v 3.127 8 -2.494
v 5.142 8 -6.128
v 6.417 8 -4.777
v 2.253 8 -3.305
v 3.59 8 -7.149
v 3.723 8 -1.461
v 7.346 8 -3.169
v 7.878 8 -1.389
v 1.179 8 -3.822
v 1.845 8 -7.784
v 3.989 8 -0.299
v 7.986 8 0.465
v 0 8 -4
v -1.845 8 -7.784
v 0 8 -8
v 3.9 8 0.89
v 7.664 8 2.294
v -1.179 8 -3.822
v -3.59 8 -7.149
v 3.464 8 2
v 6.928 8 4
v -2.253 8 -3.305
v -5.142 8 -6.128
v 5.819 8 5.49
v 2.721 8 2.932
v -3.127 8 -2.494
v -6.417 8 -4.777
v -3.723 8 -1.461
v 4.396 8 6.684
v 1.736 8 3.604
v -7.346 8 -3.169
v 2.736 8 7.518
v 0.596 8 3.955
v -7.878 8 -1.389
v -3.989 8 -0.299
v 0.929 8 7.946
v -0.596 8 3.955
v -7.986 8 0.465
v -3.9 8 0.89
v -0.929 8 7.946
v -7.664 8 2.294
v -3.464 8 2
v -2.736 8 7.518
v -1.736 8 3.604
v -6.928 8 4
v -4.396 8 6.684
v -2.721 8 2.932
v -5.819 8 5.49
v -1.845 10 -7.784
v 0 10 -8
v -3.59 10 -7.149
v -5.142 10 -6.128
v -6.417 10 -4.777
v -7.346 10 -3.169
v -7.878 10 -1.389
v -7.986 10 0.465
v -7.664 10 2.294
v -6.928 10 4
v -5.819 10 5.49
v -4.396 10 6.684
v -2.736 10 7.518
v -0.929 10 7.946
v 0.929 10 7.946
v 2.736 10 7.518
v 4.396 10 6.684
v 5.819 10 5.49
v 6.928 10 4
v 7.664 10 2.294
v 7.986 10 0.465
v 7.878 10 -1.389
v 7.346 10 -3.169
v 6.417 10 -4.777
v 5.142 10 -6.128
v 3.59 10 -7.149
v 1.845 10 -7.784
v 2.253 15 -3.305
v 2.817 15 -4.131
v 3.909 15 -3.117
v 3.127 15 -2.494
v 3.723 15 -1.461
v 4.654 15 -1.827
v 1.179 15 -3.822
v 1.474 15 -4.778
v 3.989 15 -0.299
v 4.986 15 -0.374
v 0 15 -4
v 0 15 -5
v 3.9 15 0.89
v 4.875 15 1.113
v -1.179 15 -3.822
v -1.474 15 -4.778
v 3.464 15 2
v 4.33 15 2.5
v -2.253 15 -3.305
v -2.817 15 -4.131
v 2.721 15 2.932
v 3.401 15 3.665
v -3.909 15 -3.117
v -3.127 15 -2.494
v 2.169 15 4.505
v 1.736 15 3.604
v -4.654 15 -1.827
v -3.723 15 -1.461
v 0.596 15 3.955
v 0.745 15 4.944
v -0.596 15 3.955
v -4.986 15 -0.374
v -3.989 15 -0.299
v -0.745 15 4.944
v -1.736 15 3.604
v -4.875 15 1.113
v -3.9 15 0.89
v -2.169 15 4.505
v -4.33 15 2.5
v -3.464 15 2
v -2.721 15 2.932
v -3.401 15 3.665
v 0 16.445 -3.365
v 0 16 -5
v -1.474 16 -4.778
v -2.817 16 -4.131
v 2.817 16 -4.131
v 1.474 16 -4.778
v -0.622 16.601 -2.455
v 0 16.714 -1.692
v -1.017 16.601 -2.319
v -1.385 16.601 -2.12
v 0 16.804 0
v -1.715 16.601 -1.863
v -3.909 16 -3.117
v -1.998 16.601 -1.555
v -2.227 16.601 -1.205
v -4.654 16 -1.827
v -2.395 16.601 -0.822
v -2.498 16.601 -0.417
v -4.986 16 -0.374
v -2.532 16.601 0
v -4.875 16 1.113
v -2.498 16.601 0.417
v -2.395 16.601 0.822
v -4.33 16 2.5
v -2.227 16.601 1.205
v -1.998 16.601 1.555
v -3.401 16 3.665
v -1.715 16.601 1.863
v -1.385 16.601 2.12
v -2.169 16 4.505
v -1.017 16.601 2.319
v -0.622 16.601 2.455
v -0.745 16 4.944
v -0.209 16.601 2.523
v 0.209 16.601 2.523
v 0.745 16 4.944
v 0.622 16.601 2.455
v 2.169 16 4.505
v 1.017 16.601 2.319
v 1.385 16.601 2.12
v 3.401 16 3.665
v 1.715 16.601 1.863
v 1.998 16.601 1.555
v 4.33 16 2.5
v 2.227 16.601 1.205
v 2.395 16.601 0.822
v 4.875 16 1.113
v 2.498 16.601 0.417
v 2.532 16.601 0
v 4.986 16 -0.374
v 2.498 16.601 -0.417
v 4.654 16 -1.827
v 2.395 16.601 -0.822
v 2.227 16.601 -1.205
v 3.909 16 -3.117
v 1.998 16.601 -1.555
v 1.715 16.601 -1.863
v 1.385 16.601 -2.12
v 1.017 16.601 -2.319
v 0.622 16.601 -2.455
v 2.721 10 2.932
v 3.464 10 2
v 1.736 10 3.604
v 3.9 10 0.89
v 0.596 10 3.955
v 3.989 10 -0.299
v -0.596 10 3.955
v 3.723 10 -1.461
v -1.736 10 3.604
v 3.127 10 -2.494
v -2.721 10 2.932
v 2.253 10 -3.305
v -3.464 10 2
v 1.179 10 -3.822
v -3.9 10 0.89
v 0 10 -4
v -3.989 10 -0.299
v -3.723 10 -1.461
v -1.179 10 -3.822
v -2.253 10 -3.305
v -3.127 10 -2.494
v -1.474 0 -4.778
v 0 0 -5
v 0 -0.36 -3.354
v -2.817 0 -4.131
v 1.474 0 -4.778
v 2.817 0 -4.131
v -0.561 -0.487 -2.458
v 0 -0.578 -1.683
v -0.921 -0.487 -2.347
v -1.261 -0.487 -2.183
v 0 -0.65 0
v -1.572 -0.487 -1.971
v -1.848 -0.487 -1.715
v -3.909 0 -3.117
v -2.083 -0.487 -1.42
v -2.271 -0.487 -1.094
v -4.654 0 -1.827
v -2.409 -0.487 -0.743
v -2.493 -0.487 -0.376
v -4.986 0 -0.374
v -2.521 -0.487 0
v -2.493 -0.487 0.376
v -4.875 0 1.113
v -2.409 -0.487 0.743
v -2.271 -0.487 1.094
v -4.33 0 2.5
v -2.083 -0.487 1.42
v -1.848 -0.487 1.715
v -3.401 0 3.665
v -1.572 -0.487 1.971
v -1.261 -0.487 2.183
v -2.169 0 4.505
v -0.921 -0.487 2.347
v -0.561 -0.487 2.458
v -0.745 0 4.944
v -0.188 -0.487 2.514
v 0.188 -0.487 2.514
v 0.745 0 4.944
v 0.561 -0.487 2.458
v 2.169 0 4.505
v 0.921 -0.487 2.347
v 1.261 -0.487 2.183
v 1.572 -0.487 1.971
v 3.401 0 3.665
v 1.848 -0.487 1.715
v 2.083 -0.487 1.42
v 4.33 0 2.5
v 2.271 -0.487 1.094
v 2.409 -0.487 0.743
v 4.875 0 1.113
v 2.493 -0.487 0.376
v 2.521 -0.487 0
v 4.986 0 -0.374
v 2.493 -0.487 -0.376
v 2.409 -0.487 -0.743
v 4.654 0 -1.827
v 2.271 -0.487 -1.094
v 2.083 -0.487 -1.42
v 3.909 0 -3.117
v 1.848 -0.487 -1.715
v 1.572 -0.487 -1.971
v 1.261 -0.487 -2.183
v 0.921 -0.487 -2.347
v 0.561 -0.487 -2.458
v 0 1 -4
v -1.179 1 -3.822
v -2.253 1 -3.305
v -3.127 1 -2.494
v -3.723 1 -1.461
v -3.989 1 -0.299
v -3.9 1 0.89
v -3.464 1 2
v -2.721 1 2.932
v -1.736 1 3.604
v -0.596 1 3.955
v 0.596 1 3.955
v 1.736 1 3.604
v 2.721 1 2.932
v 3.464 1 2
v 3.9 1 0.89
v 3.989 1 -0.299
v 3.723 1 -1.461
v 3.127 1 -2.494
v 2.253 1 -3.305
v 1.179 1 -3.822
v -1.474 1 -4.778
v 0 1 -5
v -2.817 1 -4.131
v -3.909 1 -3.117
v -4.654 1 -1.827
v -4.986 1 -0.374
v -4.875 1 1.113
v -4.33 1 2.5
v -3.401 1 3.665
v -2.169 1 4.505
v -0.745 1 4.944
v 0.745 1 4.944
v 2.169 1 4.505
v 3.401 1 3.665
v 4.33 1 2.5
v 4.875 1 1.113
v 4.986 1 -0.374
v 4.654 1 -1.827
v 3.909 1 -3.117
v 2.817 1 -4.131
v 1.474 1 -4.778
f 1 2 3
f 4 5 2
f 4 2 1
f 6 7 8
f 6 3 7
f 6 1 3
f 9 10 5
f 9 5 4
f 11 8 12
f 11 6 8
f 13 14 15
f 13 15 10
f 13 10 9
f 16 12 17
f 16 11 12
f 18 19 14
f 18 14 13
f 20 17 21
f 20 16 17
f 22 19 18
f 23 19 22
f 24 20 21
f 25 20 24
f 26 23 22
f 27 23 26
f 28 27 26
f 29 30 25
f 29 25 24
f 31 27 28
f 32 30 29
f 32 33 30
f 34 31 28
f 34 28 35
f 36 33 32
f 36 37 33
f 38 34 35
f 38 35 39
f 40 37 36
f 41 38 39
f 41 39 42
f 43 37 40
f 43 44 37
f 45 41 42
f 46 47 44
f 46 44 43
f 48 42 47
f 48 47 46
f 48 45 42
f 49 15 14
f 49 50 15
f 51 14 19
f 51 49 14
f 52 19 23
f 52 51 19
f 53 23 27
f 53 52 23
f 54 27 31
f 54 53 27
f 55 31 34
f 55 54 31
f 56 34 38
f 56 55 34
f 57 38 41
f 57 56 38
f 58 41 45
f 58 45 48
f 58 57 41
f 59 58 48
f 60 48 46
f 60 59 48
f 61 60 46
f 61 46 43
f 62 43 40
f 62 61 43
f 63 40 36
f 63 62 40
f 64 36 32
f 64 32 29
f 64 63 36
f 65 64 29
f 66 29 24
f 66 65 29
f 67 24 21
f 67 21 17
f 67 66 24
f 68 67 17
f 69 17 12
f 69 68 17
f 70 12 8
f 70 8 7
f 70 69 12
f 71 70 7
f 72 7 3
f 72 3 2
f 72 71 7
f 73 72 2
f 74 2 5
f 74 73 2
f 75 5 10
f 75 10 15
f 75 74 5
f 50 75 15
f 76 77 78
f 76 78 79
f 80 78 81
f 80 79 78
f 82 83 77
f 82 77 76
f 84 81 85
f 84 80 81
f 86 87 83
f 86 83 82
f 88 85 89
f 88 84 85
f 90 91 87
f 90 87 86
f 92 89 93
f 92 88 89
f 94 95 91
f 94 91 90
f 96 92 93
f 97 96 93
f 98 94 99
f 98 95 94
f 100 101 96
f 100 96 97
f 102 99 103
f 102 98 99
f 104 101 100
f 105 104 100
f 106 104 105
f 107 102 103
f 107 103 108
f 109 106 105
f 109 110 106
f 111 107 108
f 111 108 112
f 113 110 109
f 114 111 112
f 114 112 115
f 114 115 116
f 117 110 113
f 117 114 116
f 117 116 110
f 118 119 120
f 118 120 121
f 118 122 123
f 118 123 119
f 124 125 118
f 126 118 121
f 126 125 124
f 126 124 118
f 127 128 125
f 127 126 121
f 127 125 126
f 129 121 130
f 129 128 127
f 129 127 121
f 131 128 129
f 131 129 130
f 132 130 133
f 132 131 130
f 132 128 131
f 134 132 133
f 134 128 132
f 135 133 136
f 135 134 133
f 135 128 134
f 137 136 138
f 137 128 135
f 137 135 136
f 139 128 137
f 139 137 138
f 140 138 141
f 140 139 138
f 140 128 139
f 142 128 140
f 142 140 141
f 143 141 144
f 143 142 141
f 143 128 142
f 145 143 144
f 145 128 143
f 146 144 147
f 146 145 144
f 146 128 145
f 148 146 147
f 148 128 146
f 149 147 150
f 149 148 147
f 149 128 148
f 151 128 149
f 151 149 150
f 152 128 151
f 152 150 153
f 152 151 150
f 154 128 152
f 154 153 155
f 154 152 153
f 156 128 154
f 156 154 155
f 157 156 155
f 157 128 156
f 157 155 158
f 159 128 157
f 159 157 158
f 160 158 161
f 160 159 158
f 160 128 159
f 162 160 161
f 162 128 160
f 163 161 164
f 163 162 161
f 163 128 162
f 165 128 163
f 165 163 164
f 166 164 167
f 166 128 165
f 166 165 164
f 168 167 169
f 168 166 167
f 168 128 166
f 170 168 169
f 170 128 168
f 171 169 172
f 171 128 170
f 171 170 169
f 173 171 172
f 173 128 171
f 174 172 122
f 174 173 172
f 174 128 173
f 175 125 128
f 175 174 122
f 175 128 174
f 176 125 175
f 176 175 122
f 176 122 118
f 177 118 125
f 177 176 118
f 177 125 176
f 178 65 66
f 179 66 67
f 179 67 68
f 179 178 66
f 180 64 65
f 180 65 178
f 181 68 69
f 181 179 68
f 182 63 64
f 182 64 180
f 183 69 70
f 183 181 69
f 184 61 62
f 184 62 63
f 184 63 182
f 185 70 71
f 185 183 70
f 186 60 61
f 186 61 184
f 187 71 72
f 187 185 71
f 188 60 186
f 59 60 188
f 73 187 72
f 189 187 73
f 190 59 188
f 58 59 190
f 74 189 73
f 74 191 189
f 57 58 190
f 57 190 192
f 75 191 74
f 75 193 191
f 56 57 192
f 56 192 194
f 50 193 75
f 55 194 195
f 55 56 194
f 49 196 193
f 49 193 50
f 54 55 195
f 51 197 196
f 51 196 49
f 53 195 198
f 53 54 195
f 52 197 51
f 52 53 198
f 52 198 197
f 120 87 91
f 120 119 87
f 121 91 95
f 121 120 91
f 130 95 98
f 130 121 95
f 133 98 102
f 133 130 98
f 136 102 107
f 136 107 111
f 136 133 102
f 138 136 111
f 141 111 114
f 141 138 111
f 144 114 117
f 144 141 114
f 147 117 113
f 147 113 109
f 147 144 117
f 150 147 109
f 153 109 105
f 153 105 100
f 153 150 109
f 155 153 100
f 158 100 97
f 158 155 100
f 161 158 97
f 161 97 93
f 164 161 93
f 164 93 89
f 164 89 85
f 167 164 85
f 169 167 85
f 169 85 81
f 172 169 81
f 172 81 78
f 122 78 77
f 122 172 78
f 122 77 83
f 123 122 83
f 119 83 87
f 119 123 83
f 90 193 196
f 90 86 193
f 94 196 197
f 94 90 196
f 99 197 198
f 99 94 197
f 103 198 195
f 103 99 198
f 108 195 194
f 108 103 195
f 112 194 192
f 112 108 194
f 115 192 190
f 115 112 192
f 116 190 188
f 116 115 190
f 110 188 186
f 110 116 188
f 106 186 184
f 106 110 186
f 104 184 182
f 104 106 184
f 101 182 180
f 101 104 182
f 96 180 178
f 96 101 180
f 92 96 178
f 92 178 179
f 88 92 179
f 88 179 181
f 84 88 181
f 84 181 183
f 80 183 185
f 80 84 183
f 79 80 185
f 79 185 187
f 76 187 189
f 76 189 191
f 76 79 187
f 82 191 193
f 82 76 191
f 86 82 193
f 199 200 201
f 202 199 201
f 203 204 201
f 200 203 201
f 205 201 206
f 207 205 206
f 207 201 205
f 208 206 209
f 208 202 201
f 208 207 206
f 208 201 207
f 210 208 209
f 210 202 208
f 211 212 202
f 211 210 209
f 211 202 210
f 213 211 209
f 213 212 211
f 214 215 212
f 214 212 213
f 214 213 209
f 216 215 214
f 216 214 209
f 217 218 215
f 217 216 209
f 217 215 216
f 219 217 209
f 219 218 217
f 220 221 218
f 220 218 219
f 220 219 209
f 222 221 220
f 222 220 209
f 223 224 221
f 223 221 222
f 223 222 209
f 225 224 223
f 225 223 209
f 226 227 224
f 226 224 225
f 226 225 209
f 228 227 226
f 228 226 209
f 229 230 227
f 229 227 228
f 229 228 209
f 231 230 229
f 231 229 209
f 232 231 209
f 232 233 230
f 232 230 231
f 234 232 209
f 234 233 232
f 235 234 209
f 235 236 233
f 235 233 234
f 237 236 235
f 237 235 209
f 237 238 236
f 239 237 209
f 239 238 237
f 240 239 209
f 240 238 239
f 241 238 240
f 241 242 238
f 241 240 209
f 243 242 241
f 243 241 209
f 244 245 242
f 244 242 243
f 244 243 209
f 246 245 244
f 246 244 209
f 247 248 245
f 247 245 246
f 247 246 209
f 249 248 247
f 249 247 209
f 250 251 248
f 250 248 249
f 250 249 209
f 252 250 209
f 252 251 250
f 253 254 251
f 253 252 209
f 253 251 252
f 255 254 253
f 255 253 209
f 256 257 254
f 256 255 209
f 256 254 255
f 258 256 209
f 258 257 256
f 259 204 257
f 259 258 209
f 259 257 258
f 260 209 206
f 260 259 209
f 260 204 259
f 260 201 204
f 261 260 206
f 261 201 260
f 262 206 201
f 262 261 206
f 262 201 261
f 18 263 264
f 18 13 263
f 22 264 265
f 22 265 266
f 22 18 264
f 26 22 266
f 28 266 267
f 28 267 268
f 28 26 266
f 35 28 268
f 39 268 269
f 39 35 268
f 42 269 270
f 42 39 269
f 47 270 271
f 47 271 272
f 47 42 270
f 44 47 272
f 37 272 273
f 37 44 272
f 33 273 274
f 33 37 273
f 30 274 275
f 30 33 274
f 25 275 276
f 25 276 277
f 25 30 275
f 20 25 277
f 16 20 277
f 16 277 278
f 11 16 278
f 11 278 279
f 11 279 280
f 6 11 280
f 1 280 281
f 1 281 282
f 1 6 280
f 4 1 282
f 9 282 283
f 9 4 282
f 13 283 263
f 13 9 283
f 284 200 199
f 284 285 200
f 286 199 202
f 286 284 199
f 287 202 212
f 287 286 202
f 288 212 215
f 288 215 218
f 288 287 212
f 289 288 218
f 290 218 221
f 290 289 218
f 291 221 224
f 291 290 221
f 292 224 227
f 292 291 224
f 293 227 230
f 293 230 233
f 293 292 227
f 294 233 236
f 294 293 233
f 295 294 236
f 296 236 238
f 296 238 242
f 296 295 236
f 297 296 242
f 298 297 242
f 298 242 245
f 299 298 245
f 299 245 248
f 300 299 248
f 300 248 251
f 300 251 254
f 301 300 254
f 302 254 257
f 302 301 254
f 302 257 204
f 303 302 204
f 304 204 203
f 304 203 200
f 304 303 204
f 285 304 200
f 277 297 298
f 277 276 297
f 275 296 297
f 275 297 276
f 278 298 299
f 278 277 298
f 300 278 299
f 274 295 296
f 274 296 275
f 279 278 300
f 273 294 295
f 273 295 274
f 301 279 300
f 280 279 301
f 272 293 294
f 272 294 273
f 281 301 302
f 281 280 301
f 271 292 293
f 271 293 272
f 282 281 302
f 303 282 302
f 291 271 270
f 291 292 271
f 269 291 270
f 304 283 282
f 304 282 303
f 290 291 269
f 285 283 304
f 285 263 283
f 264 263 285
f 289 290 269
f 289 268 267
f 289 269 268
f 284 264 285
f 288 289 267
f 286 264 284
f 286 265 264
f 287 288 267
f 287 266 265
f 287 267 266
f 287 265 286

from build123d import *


with BuildPart() as part:
    # Esquisse1 → Base-Révolution (revolve)
    with BuildSketch(Plane.XY, mode=Mode.PRIVATE) as base_r_volution_sk:
        with BuildLine():
            Line((0, 0), (0, -0.650445183))
            ThreePointArc((0, -0.650445183), (-2.521065198, -0.487151674), (-5, 0))
            Line((-5, 0), (-5, 1))
            Line((-5, 1), (-4, 1))
            Line((-4, 1), (-4, 8))
            Line((-4, 8), (-8, 8))
            Line((-8, 8), (-8, 10))
            Line((-8, 10), (-4, 10))
            Line((-4, 10), (-4, 15))
            Line((-4, 15), (-5, 15))
            Line((-5, 15), (-5, 16))
            ThreePointArc((-5, 16), (-2.53207593, 16.601354724), (0, 16.803513576))
            Line((0, 16.803513576), (0, 16))
            Line((0, 16), (0, 0))
        make_face()
    revolve(base_r_volution_sk.sketch.rotate(Axis((0, 0, 0), (0, 1, 0)), 270), axis=Axis((0, 0, 0), (0, 1, 0)))


solid = part.part
